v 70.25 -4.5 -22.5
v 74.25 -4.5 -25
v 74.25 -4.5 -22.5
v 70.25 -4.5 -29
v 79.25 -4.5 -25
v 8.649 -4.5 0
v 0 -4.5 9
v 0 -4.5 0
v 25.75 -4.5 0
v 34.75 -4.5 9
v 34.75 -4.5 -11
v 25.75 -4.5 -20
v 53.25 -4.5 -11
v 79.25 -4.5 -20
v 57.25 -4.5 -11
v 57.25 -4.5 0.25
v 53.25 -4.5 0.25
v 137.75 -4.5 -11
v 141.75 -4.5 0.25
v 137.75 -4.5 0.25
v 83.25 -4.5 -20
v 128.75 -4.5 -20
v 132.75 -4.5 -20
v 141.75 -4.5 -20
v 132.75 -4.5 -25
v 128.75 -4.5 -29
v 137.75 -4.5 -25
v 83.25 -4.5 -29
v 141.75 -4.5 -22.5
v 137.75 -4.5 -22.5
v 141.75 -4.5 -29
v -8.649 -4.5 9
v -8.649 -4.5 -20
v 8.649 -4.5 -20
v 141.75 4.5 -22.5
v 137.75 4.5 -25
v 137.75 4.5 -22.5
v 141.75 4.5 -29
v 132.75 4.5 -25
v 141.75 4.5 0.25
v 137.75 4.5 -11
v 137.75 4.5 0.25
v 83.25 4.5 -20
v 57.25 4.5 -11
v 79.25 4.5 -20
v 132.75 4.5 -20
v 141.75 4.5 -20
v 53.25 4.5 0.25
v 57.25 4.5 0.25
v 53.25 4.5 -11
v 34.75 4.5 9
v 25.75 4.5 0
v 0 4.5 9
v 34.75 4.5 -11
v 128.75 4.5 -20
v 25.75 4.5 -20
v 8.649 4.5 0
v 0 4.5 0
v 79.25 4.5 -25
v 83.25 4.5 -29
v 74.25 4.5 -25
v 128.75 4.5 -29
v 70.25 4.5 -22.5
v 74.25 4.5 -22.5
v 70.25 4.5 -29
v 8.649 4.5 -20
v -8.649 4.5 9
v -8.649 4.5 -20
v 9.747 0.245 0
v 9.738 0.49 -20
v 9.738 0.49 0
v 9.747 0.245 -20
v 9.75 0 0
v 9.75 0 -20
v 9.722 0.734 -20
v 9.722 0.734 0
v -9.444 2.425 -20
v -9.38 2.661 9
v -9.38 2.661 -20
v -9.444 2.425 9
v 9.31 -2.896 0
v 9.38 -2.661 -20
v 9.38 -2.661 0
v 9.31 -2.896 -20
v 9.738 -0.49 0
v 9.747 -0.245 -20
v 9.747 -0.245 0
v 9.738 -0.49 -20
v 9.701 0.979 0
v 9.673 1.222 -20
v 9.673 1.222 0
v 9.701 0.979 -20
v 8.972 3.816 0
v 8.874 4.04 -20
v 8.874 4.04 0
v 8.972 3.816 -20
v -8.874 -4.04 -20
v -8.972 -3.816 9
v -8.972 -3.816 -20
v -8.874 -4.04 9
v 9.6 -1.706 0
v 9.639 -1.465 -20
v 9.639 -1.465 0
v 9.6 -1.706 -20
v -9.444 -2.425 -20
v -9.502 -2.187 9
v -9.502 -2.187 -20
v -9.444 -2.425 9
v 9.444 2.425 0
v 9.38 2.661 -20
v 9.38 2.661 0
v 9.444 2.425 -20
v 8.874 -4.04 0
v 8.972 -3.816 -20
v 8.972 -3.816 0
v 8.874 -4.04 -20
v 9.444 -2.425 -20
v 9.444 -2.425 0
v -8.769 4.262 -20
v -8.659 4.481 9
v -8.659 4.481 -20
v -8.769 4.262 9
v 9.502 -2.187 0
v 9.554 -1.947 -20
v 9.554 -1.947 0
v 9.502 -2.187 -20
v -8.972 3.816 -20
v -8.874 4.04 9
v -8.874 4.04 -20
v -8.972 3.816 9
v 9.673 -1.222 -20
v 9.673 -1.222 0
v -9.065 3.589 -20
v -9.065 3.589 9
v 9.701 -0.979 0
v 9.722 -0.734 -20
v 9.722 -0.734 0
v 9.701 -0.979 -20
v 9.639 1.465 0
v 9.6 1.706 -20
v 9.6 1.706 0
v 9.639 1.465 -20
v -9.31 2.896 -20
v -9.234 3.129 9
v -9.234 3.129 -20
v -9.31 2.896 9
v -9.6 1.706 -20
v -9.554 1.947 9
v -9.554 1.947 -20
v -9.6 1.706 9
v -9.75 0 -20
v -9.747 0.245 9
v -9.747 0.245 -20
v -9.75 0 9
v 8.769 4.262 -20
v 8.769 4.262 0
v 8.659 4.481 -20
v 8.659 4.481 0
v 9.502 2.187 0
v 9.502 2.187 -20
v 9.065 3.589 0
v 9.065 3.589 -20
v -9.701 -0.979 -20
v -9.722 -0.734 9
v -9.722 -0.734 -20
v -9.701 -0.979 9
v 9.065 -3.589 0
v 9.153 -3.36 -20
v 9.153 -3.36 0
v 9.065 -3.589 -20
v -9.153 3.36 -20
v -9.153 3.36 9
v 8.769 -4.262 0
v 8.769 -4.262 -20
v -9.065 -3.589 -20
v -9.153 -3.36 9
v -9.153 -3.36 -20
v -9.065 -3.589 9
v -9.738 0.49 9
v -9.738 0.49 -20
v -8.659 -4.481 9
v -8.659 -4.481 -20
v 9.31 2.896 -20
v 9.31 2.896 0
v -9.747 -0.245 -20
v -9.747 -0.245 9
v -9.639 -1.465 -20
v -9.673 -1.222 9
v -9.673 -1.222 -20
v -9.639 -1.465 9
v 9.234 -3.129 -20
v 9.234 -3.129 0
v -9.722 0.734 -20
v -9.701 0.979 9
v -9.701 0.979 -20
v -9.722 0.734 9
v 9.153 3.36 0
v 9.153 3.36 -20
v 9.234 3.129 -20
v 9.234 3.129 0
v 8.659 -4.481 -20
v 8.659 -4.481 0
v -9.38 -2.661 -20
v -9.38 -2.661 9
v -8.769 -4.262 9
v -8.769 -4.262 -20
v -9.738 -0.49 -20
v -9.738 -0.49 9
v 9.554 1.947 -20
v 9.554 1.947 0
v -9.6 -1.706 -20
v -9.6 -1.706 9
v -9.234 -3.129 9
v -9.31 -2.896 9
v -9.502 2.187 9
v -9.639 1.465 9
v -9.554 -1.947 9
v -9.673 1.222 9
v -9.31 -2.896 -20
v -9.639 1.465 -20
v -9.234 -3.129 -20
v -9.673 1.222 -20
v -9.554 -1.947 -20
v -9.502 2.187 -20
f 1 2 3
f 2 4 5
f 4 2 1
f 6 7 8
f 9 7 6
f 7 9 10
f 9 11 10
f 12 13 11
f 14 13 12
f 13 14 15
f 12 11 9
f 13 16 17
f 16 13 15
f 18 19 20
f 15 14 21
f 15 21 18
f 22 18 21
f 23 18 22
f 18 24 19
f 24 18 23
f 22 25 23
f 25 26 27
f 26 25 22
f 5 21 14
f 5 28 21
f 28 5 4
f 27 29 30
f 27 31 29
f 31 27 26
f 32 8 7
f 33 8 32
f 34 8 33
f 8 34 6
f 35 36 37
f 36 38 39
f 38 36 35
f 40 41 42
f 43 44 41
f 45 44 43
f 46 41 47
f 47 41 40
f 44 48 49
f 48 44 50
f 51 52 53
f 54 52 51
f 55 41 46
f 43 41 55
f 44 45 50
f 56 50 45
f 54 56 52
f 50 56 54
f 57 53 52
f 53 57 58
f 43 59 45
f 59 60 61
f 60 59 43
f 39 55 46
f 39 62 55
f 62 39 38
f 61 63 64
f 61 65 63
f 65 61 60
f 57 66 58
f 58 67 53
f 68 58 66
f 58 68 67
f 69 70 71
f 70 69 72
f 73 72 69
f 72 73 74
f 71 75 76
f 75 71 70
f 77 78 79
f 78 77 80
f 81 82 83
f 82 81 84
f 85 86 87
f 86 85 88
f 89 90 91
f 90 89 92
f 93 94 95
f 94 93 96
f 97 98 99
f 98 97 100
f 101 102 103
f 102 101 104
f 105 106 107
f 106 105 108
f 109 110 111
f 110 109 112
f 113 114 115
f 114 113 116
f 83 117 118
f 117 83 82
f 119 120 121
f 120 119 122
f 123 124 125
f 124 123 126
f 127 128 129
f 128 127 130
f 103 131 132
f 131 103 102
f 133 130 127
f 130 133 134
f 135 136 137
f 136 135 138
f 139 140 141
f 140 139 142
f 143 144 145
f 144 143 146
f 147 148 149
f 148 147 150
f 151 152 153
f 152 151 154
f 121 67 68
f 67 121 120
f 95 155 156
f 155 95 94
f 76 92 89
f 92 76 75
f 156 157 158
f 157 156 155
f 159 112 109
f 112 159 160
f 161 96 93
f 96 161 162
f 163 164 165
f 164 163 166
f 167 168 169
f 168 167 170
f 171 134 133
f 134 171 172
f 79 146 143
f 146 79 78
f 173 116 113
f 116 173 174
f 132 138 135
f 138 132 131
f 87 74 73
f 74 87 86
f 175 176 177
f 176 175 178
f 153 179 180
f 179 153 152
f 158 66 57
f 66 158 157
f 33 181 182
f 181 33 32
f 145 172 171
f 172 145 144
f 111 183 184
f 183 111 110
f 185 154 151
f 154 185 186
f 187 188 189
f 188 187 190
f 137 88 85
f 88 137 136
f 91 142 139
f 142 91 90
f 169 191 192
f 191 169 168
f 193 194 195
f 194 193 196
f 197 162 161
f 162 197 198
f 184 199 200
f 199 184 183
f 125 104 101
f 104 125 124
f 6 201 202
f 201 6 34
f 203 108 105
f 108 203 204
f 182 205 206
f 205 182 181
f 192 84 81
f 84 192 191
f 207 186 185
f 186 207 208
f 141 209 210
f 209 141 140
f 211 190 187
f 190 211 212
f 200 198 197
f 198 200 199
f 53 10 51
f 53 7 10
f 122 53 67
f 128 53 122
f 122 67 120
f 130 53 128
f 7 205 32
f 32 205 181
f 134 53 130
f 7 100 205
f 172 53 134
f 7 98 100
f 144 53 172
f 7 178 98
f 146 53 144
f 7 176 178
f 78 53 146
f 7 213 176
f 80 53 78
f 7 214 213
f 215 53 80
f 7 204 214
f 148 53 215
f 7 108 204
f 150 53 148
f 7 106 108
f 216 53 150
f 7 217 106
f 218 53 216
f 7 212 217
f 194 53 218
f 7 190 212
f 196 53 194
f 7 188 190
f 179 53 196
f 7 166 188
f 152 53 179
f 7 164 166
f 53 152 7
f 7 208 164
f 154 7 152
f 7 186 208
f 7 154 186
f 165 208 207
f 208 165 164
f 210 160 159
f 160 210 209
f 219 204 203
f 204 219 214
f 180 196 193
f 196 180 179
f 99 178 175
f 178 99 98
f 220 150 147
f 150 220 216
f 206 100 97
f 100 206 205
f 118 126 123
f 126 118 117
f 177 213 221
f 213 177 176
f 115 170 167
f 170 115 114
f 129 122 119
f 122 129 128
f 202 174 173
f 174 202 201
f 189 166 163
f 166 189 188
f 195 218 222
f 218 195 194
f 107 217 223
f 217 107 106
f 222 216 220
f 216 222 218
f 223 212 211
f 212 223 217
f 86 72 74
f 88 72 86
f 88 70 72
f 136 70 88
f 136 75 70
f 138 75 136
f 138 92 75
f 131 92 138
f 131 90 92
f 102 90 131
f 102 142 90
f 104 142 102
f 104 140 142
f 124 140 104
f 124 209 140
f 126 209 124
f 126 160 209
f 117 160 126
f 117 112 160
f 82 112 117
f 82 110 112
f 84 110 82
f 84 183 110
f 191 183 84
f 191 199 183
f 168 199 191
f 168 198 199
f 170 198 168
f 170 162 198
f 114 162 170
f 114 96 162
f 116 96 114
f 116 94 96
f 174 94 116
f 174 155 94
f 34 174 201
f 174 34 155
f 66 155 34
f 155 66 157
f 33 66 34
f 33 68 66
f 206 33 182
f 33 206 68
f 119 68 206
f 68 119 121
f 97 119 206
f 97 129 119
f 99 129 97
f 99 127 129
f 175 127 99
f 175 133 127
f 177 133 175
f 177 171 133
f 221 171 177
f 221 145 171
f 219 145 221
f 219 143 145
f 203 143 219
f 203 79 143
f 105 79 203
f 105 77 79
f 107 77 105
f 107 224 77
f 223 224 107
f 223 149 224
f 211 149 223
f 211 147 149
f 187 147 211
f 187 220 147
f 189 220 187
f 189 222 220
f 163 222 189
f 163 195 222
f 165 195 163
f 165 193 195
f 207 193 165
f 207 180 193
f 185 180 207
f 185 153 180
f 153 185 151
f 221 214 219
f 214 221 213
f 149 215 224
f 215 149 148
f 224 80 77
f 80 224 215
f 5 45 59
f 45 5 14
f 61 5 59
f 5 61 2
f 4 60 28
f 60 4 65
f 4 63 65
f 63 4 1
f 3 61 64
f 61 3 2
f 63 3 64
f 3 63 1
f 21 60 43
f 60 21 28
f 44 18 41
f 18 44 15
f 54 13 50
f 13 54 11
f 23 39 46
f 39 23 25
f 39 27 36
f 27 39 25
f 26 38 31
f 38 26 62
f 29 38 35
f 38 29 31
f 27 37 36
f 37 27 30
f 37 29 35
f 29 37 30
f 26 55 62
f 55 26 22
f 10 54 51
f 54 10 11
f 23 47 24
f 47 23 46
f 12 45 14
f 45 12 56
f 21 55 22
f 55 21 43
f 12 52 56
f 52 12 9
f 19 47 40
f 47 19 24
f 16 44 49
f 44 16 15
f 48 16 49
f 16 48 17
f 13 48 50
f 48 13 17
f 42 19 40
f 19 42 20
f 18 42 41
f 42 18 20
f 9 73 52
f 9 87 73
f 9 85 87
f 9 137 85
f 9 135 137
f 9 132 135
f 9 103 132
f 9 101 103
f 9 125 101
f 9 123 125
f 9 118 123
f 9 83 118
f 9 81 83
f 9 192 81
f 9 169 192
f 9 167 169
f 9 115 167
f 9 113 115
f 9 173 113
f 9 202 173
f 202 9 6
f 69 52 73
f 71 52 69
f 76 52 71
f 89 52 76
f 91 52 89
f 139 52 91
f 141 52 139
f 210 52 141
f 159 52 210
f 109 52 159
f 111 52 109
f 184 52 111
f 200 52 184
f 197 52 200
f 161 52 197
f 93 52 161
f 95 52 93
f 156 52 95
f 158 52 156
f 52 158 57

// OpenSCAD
/*
   w1
 ------
|      |
|      | length 
|      |          w2
       ----------------------
*/

diam      = 19.5;
thickness = 9;
length    = 20;
w1        = 16;
w2        = 107;
pin       = 4;
$fn       = 250;

module bagHolder()
{
    cube([ pin, thickness, thickness * 2 ]);
    translate([ -thickness, 0, 0 ])
    {
        cube([ thickness, thickness, pin ]);
        cube([ pin, thickness, thickness / 2 + pin / 2 ]);
    }
}
module pin(length)
{
    difference()
    {
        cylinder(d = diam, h = length, center = true);
        for (y = [ -1, 1 ])
        {
            translate([ 0, y * (diam + thickness) / 2, 0])
            {
                cube([diam, diam, length + 0.1], center = true);
            }
        }
    }
}

difference()
{
    union()
    {
        translate([ 0, 0, thickness - (length + thickness) / 2 ])
        {
            pin(length + thickness);
        }
        translate([ 0, - thickness / 2, 0 ])
        {
            cube([ w1 + diam / 2, thickness, thickness ]);
            translate([ w1 + diam / 2, 0, - length ])
            {
                cube([ thickness, thickness, length + thickness ]);
                cube([ w2 + thickness, thickness, thickness ]);
                // Pin superior interior
                translate([ w2 - 79.5, 0, thickness ])
                {
                    cube([ pin, thickness, thickness * 1.25 ]);
                }
                // Pin superior exterior
                translate([ w2 + pin + 1, 0, thickness ])
                {
                    cube([ pin, thickness, thickness * 1.25 ]);
                }
                // Pin inferior 1
                translate([ w2 * 0.5, 0, - thickness ])
                {
                    bagHolder();
                }
                // Pin inferior 1
                translate([ w2, 0, - thickness ])
                {
                    mirror([ 1, 0, 0 ])
                    {
                        bagHolder();
                    }
                }
            }
        }
    }
//    dw = 0.6;
//    for (y = [ dw / 2, -(thickness + dw / 2) ])
//    {
//        translate([ - diam, y, - length * 2 ])
//        {
//            cube([ w2 * 2, thickness, length * 4] );
//        }
//    }
}
